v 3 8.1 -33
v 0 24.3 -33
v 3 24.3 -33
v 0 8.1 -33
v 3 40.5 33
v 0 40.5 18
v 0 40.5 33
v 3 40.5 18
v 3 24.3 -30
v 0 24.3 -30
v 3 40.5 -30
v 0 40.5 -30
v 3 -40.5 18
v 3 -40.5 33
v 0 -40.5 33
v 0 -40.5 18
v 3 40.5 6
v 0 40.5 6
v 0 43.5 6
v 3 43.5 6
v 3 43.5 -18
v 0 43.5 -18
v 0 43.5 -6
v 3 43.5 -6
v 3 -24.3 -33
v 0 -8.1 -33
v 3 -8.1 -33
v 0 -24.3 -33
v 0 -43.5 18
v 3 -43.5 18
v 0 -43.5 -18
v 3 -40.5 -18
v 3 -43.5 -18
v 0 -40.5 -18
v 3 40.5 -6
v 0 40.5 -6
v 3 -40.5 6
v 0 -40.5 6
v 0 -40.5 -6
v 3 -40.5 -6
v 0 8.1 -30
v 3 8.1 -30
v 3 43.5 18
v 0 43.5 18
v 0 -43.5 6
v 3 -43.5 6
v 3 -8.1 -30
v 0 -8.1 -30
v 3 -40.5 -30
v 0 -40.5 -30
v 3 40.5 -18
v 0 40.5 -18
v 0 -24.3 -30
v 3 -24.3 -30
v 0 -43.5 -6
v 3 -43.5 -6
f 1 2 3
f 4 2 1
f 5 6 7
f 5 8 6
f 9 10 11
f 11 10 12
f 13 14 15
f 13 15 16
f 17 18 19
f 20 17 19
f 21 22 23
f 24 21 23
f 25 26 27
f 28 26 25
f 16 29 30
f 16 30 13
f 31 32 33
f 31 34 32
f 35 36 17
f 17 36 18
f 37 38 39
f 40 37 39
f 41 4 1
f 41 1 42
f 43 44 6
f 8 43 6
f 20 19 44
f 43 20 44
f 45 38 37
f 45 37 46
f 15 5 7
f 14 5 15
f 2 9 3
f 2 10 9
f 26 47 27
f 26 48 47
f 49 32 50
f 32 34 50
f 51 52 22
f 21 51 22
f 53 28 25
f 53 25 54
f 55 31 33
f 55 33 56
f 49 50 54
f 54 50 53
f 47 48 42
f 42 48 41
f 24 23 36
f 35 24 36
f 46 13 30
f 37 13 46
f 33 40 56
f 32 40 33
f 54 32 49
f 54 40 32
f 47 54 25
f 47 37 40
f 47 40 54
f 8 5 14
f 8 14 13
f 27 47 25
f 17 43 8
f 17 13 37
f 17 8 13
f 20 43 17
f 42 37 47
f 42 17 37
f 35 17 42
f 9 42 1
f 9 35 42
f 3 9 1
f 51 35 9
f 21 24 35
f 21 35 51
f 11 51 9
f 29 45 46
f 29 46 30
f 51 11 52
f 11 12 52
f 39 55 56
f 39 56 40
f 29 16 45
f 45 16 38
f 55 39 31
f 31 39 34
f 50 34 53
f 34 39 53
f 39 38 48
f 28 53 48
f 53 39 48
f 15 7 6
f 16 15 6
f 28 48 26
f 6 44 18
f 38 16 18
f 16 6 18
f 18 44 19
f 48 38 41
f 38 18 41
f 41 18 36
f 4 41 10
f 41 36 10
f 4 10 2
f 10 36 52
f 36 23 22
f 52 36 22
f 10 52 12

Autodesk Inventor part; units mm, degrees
ref_plane "YZ Plane" through (0, 0, 0) normal (1, 0, 0) x (0, 1, 0)
ref_plane "XZ Plane" through (0, 0, 0) normal (0, 1, 0) x (-1, 0, 0)
ref_plane "XY Plane" through (0, 0, 0) normal (0, 0, 1) x (1, 0, 0)
sketch "Sketch1" plane through (0, 0, 0) normal (1, 0, 0) x (0, 1, 0)
  line L0 (-40.5, 30) -> (-40.5, -30)
  line L1 (-40.5, -30) -> (40.5, -30)
  line L2 (40.5, -30) -> (40.5, 30)
  line L3 (40.5, 30) -> (-40.5, 30)
  line L4 (-40.5, 30) -> (40.5, -30) construction
  line L5 (-40.5, -30) -> (40.5, 30) construction
  line L6 (-40.5, 18) -> (-40.5, 6)
  line L7 (-40.5, 6) -> (-43.5, 6)
  line L8 (-43.5, 6) -> (-43.5, 18)
  line L9 (-43.5, 18) -> (-40.5, 18)
  line L10 (-40.5, -6) -> (-40.5, -18)
  line L11 (-40.5, -18) -> (-43.5, -18)
  line L12 (-43.5, -18) -> (-43.5, -6)
  line L13 (-43.5, -6) -> (-40.5, -6)
  line L14 (-8.1, -30) -> (-8.1, -33)
  line L15 (-8.1, -33) -> (-24.3, -33)
  line L16 (-24.3, -33) -> (-24.3, -30)
  line L17 (-24.3, -30) -> (-8.1, -30)
  line L18 (8.1, -30) -> (24.3, -30)
  line L19 (24.3, -30) -> (24.3, -33)
  line L20 (24.3, -33) -> (8.1, -33)
  line L21 (8.1, -33) -> (8.1, -30)
  line L22 (-60.9, 0) -> (60.9, 0) projected
  line L23 (0, -45.6) -> (0, 42.6) projected
  line L24 (40.5, 18) -> (40.5, 6)
  line L25 (40.5, 6) -> (43.5, 6)
  line L26 (43.5, 6) -> (43.5, 18)
  line L27 (43.5, 18) -> (40.5, 18)
  line L28 (40.5, -6) -> (40.5, -18)
  line L29 (40.5, -18) -> (43.5, -18)
  line L30 (43.5, -18) -> (43.5, -6)
  line L31 (43.5, -6) -> (40.5, -6)
  point P0 (0, 0)
  point P1 (-43.5, -12)
  point P2 (43.5, -12)
  dimension "d0" = 81
  dimension "d1" = 60
  dimension "d2" = 3
  dimension "d3" = 12
  dimension "d4" = 12
  dimension "d5" = 12
  dimension "d6" = 12
  dimension "d7" = 16.2
  dimension "d8" = 16.2
  dimension "d9" = 16.2
  dimension "d10" = 16.2
extrude "Extrusion1" add sketch "Sketch1" along normal blind 3
sketch "Sketch2" plane through (3, 0, 0) normal (1, 0, 0) x (0, 0, -1)
  line L0 (-30, 40.5) -> (-30, -40.5) projected
  line L1 (-30, -40.5) -> (-30, 40.5)
  line L2 (-30, 40.5) -> (-33, 40.5)
  line L3 (-33, 40.5) -> (-33, -40.5)
  line L4 (-33, -40.5) -> (-30, -40.5)
  point P0 (0, 0)
  dimension "d13" = 3
extrude "Extrusion2" add sketch "Sketch2" against normal blind 3
equation "\"d3\" = 0.2 * d1"
equation "\"d4\" = d3"
equation "\"d5\" = d3"
equation "\"d6\" = d4"
equation "\"d7\" = 0.2 * d0"
equation "\"d8\" = d7"
equation "\"d9\" = d7"
equation "\"d10\" = d8"
equation "\"d13\" = d2"
equation "\"d14\" = d2"
properties part number "back"
